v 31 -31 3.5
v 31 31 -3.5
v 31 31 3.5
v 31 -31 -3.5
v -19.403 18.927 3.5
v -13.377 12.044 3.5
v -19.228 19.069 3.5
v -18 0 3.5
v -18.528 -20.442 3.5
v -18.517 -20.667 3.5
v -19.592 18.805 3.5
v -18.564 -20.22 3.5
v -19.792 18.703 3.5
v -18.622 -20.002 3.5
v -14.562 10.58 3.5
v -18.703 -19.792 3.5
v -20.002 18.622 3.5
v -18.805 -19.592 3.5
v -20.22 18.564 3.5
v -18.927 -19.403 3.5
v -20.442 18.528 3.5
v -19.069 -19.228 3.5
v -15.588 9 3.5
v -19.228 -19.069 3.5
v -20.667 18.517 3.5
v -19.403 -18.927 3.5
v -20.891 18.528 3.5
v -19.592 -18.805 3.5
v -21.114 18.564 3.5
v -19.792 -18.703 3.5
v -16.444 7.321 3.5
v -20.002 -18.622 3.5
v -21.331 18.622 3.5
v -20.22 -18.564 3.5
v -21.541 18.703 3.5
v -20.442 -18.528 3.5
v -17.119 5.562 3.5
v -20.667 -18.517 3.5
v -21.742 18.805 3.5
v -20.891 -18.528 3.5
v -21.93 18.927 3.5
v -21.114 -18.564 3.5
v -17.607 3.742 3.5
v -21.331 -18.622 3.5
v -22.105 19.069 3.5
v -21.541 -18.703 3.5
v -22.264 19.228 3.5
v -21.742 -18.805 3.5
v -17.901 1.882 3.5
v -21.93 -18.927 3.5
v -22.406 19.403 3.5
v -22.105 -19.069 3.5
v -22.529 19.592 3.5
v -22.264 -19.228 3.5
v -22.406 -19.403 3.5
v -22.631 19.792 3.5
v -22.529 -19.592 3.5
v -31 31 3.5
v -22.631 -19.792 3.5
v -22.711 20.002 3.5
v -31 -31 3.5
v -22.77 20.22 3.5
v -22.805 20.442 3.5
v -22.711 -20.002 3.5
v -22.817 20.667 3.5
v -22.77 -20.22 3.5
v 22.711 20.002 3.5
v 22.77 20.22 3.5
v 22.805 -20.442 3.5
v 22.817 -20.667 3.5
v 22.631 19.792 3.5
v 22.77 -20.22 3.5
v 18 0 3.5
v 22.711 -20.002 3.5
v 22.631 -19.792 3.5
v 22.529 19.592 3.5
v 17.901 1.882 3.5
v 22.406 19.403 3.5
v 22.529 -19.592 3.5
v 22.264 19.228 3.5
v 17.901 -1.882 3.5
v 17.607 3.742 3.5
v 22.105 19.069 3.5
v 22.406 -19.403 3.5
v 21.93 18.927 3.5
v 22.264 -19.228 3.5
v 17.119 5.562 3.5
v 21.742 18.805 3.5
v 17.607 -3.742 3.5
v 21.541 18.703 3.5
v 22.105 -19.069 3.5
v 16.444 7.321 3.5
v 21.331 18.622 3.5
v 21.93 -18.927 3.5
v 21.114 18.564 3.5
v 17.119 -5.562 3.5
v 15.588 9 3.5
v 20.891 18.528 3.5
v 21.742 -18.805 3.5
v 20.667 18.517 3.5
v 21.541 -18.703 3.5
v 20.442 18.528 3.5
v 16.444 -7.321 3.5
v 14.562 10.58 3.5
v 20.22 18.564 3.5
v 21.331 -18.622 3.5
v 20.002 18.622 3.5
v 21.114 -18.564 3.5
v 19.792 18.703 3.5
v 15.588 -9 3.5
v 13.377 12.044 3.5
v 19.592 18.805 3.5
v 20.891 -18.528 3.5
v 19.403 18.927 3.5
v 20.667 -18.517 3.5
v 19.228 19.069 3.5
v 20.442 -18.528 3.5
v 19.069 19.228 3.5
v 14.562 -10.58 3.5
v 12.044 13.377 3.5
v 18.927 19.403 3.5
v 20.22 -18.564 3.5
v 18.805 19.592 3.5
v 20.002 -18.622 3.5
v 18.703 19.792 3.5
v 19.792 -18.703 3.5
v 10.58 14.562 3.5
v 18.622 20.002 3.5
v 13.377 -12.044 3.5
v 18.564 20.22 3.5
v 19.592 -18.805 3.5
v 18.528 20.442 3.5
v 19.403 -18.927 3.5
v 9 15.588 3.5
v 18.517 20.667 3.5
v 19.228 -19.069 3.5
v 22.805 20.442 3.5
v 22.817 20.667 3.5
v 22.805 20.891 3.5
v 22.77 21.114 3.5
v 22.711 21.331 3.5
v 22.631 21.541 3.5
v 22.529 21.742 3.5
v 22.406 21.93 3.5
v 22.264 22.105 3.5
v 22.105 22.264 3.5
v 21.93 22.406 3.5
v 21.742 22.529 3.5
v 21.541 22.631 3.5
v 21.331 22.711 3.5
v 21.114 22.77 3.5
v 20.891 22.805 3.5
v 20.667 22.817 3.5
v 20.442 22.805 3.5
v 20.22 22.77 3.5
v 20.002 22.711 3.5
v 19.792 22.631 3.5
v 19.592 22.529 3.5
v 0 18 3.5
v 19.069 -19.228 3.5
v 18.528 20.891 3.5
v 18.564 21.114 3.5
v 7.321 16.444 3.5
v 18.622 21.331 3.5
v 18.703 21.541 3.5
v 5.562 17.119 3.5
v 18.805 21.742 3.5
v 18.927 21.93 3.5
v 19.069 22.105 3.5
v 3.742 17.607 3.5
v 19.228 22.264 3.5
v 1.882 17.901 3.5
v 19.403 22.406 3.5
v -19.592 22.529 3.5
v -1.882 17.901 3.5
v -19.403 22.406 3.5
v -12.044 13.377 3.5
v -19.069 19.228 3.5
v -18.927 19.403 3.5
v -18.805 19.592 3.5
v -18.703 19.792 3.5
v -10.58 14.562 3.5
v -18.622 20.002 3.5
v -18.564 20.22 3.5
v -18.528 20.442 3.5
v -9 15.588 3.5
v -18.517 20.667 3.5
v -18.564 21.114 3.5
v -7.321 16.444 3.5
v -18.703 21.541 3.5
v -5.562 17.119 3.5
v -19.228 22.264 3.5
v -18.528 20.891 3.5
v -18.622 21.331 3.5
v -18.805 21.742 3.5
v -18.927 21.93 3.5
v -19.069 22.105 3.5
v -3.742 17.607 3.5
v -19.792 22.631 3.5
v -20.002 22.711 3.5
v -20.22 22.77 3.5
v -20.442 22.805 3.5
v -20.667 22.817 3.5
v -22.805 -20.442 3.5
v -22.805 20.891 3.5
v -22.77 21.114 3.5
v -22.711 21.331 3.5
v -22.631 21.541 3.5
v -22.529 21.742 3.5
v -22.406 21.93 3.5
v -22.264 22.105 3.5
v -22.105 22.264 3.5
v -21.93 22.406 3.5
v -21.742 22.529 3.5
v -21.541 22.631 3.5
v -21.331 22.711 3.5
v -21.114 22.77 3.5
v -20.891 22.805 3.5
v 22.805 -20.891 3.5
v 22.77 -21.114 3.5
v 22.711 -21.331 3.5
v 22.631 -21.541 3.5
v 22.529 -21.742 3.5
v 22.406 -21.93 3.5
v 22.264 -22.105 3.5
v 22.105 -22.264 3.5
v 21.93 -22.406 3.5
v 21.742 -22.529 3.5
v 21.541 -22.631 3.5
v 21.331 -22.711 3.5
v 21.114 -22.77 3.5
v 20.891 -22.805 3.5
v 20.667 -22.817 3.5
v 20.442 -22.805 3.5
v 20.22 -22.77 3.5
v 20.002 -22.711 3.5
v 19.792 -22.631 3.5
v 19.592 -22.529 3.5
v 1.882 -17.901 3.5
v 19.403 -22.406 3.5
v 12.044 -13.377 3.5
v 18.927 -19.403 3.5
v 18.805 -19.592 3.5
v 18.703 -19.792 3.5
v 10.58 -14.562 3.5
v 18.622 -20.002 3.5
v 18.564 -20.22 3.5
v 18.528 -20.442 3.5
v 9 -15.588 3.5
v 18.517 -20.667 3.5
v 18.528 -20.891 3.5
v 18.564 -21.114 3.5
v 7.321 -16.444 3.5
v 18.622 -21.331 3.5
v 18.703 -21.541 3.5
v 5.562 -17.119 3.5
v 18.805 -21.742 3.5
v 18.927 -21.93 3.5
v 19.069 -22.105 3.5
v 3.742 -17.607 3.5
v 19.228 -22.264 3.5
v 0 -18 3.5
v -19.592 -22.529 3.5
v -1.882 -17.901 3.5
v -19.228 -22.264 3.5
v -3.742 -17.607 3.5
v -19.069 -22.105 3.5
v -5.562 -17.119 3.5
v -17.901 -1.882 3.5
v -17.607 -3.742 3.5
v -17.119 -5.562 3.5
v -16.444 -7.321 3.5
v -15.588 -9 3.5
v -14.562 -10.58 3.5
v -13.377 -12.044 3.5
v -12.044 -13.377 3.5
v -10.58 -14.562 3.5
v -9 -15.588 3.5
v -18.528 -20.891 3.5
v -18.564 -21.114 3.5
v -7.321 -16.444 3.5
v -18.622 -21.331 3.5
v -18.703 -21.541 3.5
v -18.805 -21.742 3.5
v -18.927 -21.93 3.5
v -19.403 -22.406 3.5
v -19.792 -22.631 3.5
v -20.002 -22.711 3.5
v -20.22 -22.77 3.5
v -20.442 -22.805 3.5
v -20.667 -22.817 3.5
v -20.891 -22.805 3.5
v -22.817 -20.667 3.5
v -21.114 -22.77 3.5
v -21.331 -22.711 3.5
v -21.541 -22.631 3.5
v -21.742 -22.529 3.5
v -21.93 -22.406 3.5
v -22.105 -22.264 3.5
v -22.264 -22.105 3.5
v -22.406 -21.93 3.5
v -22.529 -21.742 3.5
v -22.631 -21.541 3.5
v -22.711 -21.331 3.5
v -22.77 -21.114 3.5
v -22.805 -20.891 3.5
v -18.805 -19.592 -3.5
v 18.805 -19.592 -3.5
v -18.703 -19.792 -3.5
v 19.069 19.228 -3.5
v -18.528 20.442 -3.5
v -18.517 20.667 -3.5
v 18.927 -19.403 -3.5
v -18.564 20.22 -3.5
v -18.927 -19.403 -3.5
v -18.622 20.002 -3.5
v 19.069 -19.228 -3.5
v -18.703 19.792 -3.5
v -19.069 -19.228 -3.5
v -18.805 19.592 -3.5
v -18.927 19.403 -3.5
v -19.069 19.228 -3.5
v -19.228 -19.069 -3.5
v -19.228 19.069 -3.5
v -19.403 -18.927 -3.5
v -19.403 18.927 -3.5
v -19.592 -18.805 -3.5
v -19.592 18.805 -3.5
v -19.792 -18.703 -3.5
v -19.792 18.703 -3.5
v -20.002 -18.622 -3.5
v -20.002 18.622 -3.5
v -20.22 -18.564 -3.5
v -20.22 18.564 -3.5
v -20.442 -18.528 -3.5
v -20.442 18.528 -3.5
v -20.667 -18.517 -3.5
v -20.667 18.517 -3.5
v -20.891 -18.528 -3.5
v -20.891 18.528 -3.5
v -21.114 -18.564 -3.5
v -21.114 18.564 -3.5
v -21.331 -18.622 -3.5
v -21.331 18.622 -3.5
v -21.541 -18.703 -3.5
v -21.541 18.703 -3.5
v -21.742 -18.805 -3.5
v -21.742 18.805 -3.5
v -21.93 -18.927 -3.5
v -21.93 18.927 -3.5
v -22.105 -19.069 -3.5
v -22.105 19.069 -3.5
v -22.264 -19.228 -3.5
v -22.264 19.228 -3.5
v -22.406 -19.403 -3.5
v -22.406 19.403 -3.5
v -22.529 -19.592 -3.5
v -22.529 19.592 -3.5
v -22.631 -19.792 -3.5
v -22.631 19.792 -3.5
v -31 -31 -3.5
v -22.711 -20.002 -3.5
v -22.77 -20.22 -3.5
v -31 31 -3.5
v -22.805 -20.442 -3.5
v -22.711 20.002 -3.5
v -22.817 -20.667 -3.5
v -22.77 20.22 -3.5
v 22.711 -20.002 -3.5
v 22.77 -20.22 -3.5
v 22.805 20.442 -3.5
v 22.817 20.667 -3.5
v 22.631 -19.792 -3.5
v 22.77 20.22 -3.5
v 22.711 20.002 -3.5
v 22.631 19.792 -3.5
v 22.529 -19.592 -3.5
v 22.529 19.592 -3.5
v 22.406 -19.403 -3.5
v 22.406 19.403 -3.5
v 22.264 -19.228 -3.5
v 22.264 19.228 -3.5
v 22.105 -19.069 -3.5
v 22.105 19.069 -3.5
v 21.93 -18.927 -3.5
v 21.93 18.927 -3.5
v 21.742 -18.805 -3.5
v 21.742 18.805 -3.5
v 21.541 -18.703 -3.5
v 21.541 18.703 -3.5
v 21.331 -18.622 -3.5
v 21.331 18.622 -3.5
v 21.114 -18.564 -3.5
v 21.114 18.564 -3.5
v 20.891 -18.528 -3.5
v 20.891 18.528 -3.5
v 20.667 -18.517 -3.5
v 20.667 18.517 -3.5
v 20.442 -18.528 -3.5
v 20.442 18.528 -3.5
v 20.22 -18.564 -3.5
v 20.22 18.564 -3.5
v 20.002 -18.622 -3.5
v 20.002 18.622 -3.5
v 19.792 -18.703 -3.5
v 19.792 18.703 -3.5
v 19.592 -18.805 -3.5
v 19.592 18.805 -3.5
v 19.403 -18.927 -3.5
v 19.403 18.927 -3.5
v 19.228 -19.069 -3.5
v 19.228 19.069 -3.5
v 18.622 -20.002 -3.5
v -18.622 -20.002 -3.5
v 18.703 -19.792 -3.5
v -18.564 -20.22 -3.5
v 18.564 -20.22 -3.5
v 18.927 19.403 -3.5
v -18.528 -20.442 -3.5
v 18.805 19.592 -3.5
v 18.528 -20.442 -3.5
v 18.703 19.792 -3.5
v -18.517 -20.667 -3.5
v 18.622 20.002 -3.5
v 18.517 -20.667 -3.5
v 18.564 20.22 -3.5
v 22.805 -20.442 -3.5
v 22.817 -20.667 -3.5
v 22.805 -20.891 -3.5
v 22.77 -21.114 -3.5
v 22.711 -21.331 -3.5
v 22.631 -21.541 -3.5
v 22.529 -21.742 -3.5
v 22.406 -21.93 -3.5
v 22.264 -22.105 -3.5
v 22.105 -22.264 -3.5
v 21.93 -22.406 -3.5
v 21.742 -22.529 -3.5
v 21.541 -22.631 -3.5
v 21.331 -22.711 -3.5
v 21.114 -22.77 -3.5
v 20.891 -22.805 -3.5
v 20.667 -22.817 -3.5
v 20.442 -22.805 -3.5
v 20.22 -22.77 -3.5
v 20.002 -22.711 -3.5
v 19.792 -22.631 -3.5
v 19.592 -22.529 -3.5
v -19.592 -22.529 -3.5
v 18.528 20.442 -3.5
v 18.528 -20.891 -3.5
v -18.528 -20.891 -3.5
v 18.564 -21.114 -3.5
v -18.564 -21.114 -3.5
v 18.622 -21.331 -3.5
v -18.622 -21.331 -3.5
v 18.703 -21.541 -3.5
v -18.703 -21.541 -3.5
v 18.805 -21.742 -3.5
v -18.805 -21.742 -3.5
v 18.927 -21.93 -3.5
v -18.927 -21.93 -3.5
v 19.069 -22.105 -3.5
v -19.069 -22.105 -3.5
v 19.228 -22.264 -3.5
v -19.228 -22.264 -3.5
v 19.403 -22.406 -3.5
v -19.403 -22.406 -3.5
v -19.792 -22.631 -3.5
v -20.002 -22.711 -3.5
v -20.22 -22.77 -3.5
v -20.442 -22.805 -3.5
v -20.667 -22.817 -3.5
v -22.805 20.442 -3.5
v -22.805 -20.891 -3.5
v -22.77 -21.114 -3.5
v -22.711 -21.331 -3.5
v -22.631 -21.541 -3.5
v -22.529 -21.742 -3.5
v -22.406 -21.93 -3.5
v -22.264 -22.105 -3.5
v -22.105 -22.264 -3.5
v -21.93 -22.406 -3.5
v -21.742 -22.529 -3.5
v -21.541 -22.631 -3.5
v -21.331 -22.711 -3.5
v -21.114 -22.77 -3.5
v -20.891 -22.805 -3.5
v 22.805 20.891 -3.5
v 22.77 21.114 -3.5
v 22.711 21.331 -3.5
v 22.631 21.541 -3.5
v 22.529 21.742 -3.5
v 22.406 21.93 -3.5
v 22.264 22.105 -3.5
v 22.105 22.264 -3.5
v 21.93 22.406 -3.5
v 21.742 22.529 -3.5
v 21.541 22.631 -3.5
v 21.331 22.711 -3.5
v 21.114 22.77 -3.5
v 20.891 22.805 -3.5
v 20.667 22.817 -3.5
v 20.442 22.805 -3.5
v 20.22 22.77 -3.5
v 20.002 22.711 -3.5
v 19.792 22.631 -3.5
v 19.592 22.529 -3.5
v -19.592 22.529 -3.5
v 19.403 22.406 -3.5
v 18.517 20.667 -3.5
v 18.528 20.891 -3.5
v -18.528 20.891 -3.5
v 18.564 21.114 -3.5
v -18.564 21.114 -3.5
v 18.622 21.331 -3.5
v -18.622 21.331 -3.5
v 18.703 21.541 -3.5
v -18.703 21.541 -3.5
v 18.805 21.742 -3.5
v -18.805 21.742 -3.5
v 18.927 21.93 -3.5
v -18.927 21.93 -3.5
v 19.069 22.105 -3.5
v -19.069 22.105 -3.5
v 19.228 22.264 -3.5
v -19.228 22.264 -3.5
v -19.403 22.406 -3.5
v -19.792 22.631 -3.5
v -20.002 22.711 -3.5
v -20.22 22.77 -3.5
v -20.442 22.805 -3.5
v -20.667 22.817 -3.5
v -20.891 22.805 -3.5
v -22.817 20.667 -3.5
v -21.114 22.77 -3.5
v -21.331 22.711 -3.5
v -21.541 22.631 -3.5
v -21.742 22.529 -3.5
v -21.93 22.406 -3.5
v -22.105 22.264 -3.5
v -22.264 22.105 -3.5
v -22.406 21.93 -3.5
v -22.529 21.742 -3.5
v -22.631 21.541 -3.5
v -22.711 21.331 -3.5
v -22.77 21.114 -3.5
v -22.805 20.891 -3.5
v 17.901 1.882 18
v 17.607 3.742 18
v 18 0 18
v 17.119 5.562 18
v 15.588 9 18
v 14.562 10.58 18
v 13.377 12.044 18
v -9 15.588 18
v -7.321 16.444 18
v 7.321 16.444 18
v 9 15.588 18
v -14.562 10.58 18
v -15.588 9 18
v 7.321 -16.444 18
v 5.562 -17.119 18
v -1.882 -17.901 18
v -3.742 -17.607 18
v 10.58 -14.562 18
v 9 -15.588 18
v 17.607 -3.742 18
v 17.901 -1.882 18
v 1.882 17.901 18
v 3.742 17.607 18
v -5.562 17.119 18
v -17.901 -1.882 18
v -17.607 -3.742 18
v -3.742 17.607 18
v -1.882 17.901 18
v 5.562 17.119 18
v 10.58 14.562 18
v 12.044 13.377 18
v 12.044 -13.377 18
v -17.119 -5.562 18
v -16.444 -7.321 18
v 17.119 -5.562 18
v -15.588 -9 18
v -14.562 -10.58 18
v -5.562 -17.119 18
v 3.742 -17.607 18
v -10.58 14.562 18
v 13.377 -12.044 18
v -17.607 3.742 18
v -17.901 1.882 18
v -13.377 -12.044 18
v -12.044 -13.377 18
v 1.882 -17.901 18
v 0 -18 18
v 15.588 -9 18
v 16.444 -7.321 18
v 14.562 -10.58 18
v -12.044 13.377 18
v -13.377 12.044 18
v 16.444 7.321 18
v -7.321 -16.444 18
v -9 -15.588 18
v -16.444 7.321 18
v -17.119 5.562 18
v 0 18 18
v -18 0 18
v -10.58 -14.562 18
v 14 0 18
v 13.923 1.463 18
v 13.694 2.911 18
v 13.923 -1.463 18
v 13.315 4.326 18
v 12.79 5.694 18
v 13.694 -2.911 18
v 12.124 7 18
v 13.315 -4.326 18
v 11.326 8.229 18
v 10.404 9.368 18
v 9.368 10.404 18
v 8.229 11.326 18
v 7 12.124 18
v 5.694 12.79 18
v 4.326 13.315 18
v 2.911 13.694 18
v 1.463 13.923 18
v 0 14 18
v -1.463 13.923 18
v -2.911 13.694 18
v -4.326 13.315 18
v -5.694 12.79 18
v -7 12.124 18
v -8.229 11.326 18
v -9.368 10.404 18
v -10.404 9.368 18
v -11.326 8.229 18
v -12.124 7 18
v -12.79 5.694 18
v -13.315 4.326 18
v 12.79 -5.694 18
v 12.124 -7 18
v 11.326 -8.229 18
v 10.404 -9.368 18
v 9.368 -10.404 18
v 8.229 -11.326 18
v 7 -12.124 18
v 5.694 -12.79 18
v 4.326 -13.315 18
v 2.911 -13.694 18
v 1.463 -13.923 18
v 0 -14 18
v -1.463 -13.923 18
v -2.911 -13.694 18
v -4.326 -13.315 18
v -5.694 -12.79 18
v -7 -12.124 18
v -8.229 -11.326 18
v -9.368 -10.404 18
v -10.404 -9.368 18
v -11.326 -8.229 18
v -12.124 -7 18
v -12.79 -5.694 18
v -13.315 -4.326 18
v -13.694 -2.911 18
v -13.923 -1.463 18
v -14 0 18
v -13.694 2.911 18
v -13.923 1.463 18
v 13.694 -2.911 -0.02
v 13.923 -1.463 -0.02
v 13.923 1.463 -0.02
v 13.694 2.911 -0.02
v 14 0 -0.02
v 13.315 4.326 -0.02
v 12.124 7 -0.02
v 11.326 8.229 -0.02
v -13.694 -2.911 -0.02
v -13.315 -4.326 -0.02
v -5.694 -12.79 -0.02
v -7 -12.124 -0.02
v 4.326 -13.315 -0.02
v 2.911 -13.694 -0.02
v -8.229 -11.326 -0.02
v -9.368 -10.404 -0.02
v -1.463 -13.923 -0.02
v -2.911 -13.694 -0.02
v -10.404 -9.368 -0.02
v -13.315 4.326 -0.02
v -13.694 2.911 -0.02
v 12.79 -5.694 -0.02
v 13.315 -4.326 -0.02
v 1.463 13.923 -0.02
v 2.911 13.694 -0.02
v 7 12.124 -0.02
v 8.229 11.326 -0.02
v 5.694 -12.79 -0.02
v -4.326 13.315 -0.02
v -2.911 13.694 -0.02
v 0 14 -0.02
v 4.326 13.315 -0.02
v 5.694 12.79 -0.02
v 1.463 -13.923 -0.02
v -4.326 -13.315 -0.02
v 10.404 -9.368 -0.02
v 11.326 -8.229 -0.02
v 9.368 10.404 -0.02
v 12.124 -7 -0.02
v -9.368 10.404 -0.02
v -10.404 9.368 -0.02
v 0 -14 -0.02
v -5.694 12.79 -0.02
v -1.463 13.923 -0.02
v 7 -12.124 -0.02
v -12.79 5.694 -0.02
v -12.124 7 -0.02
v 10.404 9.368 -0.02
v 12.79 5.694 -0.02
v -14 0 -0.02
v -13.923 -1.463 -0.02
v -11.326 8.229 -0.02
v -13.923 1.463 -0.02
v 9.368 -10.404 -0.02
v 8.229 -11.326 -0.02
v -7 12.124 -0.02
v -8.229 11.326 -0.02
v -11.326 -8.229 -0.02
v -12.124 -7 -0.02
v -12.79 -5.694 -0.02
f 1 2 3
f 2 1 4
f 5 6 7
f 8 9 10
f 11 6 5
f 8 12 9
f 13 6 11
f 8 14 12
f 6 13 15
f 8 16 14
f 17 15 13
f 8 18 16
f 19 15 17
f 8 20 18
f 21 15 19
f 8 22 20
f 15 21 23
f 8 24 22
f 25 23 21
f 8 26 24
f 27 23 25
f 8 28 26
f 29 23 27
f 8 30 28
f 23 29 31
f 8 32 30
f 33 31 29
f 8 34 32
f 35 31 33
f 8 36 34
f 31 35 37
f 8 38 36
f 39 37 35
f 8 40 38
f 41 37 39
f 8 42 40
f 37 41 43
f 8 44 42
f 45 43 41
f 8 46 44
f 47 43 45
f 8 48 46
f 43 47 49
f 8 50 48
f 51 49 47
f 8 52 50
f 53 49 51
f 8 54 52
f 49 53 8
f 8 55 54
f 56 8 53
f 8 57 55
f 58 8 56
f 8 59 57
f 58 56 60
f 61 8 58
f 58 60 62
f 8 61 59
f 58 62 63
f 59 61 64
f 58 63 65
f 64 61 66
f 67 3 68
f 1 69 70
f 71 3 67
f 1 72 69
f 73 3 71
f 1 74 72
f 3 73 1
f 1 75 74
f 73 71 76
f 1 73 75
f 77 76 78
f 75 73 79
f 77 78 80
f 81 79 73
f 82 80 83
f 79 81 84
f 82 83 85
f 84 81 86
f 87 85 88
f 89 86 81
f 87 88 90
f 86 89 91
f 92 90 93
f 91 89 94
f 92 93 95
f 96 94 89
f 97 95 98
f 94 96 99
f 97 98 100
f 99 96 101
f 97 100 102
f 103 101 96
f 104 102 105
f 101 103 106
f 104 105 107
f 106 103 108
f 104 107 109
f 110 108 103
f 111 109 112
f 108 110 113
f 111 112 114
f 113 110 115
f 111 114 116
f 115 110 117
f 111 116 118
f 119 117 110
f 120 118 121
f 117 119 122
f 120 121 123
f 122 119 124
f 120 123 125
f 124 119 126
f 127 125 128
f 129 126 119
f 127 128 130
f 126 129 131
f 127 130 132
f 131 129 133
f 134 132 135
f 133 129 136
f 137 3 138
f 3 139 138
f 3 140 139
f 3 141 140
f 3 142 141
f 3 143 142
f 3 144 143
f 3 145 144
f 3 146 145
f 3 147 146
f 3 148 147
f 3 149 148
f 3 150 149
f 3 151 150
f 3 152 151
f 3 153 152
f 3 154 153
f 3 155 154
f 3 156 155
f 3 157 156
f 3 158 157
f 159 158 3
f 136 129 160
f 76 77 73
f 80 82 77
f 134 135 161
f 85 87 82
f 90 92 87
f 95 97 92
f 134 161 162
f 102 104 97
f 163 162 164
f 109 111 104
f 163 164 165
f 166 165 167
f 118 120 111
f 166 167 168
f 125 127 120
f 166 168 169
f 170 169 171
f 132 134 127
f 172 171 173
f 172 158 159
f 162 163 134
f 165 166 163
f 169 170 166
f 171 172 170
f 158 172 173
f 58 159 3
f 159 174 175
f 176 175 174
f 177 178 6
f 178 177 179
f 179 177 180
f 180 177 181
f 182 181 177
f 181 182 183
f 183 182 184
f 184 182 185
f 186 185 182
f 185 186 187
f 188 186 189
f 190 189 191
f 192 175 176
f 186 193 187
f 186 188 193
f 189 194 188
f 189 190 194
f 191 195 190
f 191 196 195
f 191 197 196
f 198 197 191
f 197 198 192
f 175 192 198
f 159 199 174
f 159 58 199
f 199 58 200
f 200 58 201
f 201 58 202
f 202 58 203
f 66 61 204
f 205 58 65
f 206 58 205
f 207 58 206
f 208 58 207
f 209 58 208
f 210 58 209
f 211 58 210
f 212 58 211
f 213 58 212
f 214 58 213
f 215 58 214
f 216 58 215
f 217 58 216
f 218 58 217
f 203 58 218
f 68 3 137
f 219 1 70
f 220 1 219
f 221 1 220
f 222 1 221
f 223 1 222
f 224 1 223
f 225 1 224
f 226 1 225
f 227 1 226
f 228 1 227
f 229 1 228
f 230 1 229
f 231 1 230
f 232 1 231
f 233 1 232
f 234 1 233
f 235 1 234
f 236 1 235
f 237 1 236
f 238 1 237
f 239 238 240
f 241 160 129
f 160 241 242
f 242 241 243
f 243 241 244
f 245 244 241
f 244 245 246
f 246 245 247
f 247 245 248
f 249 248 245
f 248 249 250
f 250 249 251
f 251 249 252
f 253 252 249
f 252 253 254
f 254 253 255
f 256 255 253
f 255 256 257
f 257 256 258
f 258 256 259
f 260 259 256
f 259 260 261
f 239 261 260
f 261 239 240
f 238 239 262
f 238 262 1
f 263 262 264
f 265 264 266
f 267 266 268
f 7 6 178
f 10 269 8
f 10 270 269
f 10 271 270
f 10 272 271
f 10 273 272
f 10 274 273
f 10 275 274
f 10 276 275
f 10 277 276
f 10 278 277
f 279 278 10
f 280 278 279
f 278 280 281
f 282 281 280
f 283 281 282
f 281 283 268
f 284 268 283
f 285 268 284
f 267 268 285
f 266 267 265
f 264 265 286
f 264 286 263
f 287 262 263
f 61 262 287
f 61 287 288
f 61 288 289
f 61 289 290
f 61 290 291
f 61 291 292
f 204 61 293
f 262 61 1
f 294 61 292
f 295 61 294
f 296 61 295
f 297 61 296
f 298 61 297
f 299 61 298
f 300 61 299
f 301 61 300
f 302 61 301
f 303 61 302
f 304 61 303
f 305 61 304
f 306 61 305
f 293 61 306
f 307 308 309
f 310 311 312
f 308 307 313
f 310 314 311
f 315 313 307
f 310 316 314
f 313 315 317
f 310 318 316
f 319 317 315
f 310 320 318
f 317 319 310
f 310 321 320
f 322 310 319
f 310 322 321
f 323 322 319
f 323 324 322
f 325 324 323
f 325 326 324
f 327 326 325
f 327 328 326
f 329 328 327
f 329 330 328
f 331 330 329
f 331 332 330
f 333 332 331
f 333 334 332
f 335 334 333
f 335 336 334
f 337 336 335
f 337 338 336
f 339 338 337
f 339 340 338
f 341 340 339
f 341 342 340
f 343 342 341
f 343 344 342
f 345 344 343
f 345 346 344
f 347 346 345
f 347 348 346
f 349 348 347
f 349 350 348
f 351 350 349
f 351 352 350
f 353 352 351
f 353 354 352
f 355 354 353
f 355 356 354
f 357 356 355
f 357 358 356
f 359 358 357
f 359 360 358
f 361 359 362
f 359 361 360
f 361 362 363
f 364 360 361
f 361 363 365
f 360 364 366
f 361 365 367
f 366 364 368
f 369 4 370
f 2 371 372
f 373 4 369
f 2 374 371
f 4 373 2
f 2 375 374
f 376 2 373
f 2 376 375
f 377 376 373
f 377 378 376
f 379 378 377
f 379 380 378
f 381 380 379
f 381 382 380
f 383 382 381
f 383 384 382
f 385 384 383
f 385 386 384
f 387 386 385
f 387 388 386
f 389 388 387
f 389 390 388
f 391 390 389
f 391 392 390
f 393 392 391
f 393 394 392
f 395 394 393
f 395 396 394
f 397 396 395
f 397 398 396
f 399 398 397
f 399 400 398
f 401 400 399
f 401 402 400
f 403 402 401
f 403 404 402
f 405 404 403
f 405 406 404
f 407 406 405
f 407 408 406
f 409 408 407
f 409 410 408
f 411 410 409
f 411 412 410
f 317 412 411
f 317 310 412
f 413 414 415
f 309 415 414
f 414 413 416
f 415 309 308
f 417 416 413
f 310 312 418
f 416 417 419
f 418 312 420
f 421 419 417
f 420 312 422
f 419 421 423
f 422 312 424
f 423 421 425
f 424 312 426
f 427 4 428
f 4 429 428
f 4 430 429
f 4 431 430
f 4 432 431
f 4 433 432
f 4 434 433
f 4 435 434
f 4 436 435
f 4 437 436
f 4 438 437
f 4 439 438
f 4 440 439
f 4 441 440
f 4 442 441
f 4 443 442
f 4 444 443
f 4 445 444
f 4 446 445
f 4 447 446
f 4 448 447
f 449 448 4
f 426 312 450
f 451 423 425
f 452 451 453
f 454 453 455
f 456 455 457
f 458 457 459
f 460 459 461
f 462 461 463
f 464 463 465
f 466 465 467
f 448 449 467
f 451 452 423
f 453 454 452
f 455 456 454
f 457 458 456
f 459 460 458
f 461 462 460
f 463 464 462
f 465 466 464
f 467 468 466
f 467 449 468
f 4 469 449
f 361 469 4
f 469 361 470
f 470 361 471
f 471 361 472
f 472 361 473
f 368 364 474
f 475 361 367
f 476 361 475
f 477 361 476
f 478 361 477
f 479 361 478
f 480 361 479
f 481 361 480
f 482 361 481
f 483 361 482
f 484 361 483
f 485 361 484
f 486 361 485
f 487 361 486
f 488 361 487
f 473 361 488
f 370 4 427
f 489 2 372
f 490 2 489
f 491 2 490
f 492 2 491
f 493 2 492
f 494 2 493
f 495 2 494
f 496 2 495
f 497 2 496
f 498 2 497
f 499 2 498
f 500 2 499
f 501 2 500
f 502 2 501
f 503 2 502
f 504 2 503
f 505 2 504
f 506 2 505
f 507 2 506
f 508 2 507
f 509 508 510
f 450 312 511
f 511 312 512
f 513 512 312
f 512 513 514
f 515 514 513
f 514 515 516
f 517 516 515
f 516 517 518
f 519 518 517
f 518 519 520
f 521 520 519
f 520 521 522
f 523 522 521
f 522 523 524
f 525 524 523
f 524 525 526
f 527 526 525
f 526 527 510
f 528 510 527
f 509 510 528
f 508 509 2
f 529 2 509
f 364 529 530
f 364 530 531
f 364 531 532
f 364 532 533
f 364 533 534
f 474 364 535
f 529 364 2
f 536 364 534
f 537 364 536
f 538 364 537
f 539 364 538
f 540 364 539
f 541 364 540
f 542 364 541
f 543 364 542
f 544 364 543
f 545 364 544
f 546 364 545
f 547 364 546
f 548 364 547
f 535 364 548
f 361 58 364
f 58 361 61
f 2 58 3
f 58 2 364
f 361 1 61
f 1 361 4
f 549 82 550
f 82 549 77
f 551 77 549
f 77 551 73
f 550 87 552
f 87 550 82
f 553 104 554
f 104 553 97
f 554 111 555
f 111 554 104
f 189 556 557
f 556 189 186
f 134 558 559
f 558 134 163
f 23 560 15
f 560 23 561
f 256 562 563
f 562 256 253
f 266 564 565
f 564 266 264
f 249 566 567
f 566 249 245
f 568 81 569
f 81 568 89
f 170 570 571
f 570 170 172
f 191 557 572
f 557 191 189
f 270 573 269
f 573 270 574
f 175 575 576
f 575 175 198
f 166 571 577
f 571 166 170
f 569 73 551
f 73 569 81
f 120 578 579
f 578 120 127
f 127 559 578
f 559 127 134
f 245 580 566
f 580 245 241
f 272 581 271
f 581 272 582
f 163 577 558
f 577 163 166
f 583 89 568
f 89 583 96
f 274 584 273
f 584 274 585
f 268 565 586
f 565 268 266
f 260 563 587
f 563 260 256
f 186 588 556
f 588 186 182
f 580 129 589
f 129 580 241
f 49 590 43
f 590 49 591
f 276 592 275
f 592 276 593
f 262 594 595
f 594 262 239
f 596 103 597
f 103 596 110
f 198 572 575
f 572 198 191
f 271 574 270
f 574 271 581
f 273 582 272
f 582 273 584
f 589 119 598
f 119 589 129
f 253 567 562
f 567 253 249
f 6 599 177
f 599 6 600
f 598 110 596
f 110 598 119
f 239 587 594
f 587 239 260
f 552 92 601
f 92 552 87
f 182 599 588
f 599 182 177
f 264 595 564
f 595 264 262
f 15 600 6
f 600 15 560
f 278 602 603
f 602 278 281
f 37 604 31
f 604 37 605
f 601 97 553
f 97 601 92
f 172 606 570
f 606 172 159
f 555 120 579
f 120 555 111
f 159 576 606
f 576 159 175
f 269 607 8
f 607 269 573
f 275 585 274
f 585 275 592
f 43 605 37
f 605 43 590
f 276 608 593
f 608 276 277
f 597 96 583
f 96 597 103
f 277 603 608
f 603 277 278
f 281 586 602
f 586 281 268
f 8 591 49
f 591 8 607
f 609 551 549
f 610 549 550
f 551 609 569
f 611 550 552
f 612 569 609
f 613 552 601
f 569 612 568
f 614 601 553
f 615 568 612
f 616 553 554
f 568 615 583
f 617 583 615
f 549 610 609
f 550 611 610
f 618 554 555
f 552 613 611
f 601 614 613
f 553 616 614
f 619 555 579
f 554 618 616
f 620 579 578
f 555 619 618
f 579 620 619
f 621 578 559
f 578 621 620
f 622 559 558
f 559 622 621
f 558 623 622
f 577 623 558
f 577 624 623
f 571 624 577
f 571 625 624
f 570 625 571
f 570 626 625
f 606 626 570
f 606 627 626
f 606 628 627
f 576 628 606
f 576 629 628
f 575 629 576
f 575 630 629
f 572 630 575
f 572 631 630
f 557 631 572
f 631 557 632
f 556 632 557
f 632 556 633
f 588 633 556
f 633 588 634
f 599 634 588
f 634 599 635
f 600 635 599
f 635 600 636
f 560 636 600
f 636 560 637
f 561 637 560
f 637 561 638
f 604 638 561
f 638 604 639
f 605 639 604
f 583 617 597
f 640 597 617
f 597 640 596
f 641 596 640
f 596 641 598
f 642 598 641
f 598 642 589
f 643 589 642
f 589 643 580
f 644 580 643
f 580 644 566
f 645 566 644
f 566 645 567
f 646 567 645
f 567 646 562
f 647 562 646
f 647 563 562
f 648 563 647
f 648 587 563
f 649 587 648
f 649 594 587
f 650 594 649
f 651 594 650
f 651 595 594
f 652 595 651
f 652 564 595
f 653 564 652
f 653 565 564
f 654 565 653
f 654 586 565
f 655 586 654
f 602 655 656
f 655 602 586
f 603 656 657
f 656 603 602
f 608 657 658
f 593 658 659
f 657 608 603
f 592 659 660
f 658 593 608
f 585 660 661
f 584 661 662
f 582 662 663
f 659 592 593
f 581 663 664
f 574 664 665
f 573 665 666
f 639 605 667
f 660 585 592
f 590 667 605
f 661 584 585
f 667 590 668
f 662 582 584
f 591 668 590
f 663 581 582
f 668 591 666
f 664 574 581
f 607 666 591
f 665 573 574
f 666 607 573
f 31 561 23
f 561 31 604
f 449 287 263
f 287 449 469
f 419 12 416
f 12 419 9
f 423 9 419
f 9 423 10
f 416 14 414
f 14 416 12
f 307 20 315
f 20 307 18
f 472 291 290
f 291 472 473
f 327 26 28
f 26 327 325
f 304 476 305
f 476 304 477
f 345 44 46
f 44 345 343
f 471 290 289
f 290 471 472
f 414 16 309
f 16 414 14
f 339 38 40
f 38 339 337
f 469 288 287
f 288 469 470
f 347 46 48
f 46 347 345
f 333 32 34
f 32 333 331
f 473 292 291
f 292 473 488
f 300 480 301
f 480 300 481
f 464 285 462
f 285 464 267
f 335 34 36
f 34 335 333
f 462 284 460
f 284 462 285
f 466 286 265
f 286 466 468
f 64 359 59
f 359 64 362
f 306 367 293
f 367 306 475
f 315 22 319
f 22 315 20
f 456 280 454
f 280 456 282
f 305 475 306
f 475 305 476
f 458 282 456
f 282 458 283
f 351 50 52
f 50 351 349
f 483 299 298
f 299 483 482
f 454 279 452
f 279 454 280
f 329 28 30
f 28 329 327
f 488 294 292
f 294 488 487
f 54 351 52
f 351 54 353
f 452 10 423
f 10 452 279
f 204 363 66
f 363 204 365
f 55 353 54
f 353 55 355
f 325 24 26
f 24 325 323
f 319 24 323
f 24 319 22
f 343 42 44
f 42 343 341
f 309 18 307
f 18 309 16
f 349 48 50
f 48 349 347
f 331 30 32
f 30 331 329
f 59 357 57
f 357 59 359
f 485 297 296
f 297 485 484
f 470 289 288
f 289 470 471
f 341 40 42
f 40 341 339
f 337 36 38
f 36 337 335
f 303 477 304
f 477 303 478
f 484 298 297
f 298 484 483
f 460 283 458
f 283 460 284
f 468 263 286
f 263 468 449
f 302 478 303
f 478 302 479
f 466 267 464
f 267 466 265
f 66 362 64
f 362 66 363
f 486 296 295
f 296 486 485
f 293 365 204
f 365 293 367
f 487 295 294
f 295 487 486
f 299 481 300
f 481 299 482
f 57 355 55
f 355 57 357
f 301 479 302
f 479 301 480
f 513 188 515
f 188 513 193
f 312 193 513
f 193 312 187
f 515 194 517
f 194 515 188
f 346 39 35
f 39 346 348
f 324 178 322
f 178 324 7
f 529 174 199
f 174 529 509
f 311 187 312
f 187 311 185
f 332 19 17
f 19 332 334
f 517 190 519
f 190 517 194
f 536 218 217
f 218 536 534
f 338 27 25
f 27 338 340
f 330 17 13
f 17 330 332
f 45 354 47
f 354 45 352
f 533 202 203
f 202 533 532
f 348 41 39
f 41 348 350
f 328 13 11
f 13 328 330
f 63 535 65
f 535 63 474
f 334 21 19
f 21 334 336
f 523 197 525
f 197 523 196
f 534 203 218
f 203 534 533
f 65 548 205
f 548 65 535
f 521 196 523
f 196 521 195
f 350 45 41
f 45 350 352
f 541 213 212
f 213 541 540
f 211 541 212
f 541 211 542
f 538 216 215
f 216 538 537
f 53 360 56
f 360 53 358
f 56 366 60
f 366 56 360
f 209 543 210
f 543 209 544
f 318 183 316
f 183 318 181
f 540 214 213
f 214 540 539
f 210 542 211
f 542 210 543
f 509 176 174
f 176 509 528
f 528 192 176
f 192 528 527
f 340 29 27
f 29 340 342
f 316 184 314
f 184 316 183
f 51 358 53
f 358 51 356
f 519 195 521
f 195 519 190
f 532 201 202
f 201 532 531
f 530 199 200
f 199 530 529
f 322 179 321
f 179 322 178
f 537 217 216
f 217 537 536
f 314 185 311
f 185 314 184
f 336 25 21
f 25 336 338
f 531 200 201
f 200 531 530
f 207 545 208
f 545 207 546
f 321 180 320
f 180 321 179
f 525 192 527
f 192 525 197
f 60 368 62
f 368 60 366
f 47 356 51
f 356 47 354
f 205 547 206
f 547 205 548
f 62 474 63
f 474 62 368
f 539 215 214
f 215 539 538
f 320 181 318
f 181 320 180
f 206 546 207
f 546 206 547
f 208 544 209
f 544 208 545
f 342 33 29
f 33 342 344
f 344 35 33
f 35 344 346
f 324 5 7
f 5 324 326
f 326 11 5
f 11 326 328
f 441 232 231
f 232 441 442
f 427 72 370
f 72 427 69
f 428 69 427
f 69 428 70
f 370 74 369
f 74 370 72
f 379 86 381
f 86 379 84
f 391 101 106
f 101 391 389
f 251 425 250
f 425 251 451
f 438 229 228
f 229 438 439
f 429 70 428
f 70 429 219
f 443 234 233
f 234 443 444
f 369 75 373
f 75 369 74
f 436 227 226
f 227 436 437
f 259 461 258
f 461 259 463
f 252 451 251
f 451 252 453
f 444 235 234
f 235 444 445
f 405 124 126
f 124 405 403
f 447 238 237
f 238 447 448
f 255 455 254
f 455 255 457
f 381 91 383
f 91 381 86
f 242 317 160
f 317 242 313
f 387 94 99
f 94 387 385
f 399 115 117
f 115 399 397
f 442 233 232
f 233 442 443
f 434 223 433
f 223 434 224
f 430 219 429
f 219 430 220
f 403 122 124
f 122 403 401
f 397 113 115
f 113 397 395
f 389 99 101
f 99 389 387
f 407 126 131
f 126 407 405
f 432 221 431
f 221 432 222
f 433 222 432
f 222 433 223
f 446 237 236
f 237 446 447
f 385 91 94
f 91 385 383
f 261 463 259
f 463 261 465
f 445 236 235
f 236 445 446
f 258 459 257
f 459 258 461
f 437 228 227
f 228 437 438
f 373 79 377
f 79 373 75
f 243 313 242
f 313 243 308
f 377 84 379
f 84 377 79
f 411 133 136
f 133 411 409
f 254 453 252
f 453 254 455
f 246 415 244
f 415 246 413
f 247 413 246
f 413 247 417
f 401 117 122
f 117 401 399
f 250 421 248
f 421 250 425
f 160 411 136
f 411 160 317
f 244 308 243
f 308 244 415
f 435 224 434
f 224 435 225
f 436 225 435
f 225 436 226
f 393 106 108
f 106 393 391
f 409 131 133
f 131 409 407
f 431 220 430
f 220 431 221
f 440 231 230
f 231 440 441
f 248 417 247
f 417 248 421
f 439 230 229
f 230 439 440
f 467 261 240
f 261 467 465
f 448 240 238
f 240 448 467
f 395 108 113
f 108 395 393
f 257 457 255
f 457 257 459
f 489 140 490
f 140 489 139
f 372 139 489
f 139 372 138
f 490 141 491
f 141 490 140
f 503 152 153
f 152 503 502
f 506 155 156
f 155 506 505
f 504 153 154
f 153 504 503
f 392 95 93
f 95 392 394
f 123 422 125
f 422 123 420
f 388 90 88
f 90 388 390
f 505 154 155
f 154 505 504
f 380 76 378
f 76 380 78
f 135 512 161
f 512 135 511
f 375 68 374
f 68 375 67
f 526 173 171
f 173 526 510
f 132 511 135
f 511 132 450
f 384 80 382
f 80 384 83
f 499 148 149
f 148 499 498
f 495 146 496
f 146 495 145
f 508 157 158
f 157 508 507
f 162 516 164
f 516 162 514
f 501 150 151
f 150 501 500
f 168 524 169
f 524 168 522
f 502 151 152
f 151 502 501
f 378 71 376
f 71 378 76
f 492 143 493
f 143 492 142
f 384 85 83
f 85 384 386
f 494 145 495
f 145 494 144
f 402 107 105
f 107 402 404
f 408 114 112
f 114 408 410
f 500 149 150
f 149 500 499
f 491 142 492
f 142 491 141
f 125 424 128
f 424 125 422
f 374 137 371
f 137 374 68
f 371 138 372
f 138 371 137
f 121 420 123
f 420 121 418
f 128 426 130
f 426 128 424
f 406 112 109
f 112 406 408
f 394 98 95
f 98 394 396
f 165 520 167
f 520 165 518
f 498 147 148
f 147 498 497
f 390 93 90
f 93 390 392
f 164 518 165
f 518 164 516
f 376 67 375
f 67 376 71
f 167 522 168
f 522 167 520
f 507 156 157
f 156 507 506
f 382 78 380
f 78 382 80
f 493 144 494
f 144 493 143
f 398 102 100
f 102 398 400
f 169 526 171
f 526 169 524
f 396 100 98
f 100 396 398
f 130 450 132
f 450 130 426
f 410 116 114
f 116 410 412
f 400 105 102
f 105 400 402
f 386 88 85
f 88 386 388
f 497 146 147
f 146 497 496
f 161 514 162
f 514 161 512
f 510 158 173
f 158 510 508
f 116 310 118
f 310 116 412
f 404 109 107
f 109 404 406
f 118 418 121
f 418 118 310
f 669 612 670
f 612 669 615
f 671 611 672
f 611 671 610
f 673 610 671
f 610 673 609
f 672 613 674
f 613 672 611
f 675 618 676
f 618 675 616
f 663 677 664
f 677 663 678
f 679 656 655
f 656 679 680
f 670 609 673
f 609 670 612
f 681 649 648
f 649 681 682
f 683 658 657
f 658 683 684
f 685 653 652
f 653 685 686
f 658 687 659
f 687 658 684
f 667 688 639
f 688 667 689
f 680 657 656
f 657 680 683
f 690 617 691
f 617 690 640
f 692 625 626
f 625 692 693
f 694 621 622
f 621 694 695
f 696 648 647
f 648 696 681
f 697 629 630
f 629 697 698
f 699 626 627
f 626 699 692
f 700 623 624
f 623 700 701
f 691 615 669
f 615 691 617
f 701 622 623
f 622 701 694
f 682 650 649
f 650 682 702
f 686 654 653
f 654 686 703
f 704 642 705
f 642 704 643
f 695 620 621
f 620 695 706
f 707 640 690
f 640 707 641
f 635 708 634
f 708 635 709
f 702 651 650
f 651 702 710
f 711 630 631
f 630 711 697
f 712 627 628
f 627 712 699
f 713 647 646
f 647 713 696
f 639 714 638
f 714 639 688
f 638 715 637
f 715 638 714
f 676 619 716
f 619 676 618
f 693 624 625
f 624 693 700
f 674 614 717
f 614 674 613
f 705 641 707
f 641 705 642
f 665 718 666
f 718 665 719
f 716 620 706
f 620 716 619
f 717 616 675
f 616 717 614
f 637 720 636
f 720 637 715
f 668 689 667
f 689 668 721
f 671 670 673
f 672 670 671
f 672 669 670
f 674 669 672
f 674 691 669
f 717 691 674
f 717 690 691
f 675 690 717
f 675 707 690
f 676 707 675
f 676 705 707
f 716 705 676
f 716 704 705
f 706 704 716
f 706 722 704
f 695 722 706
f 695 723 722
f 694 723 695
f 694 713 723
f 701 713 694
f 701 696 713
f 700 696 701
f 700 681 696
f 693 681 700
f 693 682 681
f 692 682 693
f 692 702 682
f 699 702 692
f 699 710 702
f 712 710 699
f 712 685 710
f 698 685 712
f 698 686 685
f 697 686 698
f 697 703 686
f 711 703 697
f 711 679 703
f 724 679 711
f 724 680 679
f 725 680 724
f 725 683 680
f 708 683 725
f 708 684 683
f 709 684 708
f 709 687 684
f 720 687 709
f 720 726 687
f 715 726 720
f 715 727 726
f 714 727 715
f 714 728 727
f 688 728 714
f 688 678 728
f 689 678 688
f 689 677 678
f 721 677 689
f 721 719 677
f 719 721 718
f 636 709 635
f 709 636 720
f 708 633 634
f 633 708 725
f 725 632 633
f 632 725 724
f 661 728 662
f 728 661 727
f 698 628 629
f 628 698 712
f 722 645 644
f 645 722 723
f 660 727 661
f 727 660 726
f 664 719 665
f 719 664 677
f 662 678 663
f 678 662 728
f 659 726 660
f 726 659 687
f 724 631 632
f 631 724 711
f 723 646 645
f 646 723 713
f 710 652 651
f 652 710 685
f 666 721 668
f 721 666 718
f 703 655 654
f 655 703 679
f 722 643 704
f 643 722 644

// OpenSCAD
// Flange bearing block for 28 mm bearing OD.
$fn = 60;
eps = 0.02;
bearing_d = 28;
plate_l = bearing_d + 34;
plate_t = 7;
hub_h = bearing_d / 2 + 4;
difference() {
    union() {
        cube([plate_l, plate_l, plate_t], center = true);
        cylinder(d = bearing_d + 8, h = hub_h);
    }
    translate([0, 0, -eps]) cylinder(d = bearing_d, h = hub_h + 2 * eps);
    for (x = [-plate_l / 3, plate_l / 3], y = [-plate_l / 3, plate_l / 3])
        translate([x, y, -plate_t / 2 - eps]) cylinder(d = 4.3, h = plate_t + 2 * eps);
}
